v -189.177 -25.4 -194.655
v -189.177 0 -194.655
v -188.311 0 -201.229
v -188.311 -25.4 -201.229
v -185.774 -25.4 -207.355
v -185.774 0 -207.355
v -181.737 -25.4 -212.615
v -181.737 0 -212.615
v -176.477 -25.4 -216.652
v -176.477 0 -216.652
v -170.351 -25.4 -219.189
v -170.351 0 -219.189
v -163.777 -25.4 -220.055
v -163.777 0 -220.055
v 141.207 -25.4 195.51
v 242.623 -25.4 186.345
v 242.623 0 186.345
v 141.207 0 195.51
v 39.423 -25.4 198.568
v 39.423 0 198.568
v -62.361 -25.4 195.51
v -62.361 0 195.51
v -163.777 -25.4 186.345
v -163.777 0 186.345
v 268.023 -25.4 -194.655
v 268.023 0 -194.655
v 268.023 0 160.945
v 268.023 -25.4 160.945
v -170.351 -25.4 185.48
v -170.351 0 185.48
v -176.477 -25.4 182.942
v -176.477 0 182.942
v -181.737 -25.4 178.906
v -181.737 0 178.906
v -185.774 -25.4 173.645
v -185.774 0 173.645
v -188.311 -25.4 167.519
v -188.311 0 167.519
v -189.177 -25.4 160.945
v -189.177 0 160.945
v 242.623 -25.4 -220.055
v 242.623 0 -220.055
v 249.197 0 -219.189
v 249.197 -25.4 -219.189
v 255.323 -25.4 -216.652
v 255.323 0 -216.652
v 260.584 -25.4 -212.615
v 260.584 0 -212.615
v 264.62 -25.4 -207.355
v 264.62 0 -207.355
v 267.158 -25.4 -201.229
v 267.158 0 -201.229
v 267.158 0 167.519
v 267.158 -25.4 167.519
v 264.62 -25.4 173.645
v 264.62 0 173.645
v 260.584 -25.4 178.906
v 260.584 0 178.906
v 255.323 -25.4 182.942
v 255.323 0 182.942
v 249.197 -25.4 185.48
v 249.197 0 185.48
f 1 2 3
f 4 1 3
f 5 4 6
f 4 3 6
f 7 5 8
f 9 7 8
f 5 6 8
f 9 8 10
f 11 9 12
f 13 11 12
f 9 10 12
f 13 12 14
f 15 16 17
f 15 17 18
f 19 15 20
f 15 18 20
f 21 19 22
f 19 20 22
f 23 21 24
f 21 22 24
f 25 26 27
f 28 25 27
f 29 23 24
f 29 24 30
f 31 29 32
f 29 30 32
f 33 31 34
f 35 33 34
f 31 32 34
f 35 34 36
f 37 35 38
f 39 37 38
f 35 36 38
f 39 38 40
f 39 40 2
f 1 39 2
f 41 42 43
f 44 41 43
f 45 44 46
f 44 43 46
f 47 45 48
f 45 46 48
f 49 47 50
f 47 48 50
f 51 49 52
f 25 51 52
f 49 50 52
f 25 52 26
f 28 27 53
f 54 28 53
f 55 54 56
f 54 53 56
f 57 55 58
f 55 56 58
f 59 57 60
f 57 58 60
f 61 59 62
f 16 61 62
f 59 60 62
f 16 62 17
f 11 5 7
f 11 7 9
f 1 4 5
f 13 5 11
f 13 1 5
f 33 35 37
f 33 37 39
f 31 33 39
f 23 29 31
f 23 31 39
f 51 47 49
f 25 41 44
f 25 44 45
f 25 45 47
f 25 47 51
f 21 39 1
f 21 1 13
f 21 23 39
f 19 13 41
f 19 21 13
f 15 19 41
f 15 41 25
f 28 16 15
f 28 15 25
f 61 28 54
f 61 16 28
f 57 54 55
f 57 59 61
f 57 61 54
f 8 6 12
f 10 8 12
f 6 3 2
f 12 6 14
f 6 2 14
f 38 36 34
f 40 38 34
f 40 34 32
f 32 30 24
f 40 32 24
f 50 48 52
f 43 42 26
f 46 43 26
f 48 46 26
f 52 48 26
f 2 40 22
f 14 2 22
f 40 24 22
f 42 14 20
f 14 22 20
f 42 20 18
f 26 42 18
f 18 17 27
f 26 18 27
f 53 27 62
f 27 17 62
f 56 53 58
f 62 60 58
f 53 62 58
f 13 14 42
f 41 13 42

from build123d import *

# Parameters (mm, degrees)
F1_DEPTH = 25.4


with BuildPart() as f1:
    # F0 (on Front) → F1 (new body)
    with BuildSketch(Plane.XZ):
        with BuildLine():
            ThreePointArc((242.623108, 186.345377), (39.423108, 198.567937), (-163.776892, 186.345377))
            Line((-163.776892, 186.345377), (242.623108, 186.345377))
        make_face()
        with BuildLine():
            Line((242.623108, 186.345377), (-163.776892, 186.345377))
            ThreePointArc((-163.776892, 186.345377), (-181.737404, 178.905889), (-189.176892, 160.945377))
            Line((-189.176892, 160.945377), (-189.176892, -194.654623))
            ThreePointArc((-189.176892, -194.654623), (-181.737404, -212.615136), (-163.776892, -220.054623))
            Line((-163.776892, -220.054623), (242.623108, -220.054623))
            ThreePointArc((242.623108, -220.054623), (260.58362, -212.615136), (268.023108, -194.654623))
            Line((268.023108, -194.654623), (268.023108, 160.945377))
            ThreePointArc((268.023108, 160.945377), (260.58362, 178.905889), (242.623108, 186.345377))
        make_face()
    extrude(amount=F1_DEPTH)


solid = f1.part
